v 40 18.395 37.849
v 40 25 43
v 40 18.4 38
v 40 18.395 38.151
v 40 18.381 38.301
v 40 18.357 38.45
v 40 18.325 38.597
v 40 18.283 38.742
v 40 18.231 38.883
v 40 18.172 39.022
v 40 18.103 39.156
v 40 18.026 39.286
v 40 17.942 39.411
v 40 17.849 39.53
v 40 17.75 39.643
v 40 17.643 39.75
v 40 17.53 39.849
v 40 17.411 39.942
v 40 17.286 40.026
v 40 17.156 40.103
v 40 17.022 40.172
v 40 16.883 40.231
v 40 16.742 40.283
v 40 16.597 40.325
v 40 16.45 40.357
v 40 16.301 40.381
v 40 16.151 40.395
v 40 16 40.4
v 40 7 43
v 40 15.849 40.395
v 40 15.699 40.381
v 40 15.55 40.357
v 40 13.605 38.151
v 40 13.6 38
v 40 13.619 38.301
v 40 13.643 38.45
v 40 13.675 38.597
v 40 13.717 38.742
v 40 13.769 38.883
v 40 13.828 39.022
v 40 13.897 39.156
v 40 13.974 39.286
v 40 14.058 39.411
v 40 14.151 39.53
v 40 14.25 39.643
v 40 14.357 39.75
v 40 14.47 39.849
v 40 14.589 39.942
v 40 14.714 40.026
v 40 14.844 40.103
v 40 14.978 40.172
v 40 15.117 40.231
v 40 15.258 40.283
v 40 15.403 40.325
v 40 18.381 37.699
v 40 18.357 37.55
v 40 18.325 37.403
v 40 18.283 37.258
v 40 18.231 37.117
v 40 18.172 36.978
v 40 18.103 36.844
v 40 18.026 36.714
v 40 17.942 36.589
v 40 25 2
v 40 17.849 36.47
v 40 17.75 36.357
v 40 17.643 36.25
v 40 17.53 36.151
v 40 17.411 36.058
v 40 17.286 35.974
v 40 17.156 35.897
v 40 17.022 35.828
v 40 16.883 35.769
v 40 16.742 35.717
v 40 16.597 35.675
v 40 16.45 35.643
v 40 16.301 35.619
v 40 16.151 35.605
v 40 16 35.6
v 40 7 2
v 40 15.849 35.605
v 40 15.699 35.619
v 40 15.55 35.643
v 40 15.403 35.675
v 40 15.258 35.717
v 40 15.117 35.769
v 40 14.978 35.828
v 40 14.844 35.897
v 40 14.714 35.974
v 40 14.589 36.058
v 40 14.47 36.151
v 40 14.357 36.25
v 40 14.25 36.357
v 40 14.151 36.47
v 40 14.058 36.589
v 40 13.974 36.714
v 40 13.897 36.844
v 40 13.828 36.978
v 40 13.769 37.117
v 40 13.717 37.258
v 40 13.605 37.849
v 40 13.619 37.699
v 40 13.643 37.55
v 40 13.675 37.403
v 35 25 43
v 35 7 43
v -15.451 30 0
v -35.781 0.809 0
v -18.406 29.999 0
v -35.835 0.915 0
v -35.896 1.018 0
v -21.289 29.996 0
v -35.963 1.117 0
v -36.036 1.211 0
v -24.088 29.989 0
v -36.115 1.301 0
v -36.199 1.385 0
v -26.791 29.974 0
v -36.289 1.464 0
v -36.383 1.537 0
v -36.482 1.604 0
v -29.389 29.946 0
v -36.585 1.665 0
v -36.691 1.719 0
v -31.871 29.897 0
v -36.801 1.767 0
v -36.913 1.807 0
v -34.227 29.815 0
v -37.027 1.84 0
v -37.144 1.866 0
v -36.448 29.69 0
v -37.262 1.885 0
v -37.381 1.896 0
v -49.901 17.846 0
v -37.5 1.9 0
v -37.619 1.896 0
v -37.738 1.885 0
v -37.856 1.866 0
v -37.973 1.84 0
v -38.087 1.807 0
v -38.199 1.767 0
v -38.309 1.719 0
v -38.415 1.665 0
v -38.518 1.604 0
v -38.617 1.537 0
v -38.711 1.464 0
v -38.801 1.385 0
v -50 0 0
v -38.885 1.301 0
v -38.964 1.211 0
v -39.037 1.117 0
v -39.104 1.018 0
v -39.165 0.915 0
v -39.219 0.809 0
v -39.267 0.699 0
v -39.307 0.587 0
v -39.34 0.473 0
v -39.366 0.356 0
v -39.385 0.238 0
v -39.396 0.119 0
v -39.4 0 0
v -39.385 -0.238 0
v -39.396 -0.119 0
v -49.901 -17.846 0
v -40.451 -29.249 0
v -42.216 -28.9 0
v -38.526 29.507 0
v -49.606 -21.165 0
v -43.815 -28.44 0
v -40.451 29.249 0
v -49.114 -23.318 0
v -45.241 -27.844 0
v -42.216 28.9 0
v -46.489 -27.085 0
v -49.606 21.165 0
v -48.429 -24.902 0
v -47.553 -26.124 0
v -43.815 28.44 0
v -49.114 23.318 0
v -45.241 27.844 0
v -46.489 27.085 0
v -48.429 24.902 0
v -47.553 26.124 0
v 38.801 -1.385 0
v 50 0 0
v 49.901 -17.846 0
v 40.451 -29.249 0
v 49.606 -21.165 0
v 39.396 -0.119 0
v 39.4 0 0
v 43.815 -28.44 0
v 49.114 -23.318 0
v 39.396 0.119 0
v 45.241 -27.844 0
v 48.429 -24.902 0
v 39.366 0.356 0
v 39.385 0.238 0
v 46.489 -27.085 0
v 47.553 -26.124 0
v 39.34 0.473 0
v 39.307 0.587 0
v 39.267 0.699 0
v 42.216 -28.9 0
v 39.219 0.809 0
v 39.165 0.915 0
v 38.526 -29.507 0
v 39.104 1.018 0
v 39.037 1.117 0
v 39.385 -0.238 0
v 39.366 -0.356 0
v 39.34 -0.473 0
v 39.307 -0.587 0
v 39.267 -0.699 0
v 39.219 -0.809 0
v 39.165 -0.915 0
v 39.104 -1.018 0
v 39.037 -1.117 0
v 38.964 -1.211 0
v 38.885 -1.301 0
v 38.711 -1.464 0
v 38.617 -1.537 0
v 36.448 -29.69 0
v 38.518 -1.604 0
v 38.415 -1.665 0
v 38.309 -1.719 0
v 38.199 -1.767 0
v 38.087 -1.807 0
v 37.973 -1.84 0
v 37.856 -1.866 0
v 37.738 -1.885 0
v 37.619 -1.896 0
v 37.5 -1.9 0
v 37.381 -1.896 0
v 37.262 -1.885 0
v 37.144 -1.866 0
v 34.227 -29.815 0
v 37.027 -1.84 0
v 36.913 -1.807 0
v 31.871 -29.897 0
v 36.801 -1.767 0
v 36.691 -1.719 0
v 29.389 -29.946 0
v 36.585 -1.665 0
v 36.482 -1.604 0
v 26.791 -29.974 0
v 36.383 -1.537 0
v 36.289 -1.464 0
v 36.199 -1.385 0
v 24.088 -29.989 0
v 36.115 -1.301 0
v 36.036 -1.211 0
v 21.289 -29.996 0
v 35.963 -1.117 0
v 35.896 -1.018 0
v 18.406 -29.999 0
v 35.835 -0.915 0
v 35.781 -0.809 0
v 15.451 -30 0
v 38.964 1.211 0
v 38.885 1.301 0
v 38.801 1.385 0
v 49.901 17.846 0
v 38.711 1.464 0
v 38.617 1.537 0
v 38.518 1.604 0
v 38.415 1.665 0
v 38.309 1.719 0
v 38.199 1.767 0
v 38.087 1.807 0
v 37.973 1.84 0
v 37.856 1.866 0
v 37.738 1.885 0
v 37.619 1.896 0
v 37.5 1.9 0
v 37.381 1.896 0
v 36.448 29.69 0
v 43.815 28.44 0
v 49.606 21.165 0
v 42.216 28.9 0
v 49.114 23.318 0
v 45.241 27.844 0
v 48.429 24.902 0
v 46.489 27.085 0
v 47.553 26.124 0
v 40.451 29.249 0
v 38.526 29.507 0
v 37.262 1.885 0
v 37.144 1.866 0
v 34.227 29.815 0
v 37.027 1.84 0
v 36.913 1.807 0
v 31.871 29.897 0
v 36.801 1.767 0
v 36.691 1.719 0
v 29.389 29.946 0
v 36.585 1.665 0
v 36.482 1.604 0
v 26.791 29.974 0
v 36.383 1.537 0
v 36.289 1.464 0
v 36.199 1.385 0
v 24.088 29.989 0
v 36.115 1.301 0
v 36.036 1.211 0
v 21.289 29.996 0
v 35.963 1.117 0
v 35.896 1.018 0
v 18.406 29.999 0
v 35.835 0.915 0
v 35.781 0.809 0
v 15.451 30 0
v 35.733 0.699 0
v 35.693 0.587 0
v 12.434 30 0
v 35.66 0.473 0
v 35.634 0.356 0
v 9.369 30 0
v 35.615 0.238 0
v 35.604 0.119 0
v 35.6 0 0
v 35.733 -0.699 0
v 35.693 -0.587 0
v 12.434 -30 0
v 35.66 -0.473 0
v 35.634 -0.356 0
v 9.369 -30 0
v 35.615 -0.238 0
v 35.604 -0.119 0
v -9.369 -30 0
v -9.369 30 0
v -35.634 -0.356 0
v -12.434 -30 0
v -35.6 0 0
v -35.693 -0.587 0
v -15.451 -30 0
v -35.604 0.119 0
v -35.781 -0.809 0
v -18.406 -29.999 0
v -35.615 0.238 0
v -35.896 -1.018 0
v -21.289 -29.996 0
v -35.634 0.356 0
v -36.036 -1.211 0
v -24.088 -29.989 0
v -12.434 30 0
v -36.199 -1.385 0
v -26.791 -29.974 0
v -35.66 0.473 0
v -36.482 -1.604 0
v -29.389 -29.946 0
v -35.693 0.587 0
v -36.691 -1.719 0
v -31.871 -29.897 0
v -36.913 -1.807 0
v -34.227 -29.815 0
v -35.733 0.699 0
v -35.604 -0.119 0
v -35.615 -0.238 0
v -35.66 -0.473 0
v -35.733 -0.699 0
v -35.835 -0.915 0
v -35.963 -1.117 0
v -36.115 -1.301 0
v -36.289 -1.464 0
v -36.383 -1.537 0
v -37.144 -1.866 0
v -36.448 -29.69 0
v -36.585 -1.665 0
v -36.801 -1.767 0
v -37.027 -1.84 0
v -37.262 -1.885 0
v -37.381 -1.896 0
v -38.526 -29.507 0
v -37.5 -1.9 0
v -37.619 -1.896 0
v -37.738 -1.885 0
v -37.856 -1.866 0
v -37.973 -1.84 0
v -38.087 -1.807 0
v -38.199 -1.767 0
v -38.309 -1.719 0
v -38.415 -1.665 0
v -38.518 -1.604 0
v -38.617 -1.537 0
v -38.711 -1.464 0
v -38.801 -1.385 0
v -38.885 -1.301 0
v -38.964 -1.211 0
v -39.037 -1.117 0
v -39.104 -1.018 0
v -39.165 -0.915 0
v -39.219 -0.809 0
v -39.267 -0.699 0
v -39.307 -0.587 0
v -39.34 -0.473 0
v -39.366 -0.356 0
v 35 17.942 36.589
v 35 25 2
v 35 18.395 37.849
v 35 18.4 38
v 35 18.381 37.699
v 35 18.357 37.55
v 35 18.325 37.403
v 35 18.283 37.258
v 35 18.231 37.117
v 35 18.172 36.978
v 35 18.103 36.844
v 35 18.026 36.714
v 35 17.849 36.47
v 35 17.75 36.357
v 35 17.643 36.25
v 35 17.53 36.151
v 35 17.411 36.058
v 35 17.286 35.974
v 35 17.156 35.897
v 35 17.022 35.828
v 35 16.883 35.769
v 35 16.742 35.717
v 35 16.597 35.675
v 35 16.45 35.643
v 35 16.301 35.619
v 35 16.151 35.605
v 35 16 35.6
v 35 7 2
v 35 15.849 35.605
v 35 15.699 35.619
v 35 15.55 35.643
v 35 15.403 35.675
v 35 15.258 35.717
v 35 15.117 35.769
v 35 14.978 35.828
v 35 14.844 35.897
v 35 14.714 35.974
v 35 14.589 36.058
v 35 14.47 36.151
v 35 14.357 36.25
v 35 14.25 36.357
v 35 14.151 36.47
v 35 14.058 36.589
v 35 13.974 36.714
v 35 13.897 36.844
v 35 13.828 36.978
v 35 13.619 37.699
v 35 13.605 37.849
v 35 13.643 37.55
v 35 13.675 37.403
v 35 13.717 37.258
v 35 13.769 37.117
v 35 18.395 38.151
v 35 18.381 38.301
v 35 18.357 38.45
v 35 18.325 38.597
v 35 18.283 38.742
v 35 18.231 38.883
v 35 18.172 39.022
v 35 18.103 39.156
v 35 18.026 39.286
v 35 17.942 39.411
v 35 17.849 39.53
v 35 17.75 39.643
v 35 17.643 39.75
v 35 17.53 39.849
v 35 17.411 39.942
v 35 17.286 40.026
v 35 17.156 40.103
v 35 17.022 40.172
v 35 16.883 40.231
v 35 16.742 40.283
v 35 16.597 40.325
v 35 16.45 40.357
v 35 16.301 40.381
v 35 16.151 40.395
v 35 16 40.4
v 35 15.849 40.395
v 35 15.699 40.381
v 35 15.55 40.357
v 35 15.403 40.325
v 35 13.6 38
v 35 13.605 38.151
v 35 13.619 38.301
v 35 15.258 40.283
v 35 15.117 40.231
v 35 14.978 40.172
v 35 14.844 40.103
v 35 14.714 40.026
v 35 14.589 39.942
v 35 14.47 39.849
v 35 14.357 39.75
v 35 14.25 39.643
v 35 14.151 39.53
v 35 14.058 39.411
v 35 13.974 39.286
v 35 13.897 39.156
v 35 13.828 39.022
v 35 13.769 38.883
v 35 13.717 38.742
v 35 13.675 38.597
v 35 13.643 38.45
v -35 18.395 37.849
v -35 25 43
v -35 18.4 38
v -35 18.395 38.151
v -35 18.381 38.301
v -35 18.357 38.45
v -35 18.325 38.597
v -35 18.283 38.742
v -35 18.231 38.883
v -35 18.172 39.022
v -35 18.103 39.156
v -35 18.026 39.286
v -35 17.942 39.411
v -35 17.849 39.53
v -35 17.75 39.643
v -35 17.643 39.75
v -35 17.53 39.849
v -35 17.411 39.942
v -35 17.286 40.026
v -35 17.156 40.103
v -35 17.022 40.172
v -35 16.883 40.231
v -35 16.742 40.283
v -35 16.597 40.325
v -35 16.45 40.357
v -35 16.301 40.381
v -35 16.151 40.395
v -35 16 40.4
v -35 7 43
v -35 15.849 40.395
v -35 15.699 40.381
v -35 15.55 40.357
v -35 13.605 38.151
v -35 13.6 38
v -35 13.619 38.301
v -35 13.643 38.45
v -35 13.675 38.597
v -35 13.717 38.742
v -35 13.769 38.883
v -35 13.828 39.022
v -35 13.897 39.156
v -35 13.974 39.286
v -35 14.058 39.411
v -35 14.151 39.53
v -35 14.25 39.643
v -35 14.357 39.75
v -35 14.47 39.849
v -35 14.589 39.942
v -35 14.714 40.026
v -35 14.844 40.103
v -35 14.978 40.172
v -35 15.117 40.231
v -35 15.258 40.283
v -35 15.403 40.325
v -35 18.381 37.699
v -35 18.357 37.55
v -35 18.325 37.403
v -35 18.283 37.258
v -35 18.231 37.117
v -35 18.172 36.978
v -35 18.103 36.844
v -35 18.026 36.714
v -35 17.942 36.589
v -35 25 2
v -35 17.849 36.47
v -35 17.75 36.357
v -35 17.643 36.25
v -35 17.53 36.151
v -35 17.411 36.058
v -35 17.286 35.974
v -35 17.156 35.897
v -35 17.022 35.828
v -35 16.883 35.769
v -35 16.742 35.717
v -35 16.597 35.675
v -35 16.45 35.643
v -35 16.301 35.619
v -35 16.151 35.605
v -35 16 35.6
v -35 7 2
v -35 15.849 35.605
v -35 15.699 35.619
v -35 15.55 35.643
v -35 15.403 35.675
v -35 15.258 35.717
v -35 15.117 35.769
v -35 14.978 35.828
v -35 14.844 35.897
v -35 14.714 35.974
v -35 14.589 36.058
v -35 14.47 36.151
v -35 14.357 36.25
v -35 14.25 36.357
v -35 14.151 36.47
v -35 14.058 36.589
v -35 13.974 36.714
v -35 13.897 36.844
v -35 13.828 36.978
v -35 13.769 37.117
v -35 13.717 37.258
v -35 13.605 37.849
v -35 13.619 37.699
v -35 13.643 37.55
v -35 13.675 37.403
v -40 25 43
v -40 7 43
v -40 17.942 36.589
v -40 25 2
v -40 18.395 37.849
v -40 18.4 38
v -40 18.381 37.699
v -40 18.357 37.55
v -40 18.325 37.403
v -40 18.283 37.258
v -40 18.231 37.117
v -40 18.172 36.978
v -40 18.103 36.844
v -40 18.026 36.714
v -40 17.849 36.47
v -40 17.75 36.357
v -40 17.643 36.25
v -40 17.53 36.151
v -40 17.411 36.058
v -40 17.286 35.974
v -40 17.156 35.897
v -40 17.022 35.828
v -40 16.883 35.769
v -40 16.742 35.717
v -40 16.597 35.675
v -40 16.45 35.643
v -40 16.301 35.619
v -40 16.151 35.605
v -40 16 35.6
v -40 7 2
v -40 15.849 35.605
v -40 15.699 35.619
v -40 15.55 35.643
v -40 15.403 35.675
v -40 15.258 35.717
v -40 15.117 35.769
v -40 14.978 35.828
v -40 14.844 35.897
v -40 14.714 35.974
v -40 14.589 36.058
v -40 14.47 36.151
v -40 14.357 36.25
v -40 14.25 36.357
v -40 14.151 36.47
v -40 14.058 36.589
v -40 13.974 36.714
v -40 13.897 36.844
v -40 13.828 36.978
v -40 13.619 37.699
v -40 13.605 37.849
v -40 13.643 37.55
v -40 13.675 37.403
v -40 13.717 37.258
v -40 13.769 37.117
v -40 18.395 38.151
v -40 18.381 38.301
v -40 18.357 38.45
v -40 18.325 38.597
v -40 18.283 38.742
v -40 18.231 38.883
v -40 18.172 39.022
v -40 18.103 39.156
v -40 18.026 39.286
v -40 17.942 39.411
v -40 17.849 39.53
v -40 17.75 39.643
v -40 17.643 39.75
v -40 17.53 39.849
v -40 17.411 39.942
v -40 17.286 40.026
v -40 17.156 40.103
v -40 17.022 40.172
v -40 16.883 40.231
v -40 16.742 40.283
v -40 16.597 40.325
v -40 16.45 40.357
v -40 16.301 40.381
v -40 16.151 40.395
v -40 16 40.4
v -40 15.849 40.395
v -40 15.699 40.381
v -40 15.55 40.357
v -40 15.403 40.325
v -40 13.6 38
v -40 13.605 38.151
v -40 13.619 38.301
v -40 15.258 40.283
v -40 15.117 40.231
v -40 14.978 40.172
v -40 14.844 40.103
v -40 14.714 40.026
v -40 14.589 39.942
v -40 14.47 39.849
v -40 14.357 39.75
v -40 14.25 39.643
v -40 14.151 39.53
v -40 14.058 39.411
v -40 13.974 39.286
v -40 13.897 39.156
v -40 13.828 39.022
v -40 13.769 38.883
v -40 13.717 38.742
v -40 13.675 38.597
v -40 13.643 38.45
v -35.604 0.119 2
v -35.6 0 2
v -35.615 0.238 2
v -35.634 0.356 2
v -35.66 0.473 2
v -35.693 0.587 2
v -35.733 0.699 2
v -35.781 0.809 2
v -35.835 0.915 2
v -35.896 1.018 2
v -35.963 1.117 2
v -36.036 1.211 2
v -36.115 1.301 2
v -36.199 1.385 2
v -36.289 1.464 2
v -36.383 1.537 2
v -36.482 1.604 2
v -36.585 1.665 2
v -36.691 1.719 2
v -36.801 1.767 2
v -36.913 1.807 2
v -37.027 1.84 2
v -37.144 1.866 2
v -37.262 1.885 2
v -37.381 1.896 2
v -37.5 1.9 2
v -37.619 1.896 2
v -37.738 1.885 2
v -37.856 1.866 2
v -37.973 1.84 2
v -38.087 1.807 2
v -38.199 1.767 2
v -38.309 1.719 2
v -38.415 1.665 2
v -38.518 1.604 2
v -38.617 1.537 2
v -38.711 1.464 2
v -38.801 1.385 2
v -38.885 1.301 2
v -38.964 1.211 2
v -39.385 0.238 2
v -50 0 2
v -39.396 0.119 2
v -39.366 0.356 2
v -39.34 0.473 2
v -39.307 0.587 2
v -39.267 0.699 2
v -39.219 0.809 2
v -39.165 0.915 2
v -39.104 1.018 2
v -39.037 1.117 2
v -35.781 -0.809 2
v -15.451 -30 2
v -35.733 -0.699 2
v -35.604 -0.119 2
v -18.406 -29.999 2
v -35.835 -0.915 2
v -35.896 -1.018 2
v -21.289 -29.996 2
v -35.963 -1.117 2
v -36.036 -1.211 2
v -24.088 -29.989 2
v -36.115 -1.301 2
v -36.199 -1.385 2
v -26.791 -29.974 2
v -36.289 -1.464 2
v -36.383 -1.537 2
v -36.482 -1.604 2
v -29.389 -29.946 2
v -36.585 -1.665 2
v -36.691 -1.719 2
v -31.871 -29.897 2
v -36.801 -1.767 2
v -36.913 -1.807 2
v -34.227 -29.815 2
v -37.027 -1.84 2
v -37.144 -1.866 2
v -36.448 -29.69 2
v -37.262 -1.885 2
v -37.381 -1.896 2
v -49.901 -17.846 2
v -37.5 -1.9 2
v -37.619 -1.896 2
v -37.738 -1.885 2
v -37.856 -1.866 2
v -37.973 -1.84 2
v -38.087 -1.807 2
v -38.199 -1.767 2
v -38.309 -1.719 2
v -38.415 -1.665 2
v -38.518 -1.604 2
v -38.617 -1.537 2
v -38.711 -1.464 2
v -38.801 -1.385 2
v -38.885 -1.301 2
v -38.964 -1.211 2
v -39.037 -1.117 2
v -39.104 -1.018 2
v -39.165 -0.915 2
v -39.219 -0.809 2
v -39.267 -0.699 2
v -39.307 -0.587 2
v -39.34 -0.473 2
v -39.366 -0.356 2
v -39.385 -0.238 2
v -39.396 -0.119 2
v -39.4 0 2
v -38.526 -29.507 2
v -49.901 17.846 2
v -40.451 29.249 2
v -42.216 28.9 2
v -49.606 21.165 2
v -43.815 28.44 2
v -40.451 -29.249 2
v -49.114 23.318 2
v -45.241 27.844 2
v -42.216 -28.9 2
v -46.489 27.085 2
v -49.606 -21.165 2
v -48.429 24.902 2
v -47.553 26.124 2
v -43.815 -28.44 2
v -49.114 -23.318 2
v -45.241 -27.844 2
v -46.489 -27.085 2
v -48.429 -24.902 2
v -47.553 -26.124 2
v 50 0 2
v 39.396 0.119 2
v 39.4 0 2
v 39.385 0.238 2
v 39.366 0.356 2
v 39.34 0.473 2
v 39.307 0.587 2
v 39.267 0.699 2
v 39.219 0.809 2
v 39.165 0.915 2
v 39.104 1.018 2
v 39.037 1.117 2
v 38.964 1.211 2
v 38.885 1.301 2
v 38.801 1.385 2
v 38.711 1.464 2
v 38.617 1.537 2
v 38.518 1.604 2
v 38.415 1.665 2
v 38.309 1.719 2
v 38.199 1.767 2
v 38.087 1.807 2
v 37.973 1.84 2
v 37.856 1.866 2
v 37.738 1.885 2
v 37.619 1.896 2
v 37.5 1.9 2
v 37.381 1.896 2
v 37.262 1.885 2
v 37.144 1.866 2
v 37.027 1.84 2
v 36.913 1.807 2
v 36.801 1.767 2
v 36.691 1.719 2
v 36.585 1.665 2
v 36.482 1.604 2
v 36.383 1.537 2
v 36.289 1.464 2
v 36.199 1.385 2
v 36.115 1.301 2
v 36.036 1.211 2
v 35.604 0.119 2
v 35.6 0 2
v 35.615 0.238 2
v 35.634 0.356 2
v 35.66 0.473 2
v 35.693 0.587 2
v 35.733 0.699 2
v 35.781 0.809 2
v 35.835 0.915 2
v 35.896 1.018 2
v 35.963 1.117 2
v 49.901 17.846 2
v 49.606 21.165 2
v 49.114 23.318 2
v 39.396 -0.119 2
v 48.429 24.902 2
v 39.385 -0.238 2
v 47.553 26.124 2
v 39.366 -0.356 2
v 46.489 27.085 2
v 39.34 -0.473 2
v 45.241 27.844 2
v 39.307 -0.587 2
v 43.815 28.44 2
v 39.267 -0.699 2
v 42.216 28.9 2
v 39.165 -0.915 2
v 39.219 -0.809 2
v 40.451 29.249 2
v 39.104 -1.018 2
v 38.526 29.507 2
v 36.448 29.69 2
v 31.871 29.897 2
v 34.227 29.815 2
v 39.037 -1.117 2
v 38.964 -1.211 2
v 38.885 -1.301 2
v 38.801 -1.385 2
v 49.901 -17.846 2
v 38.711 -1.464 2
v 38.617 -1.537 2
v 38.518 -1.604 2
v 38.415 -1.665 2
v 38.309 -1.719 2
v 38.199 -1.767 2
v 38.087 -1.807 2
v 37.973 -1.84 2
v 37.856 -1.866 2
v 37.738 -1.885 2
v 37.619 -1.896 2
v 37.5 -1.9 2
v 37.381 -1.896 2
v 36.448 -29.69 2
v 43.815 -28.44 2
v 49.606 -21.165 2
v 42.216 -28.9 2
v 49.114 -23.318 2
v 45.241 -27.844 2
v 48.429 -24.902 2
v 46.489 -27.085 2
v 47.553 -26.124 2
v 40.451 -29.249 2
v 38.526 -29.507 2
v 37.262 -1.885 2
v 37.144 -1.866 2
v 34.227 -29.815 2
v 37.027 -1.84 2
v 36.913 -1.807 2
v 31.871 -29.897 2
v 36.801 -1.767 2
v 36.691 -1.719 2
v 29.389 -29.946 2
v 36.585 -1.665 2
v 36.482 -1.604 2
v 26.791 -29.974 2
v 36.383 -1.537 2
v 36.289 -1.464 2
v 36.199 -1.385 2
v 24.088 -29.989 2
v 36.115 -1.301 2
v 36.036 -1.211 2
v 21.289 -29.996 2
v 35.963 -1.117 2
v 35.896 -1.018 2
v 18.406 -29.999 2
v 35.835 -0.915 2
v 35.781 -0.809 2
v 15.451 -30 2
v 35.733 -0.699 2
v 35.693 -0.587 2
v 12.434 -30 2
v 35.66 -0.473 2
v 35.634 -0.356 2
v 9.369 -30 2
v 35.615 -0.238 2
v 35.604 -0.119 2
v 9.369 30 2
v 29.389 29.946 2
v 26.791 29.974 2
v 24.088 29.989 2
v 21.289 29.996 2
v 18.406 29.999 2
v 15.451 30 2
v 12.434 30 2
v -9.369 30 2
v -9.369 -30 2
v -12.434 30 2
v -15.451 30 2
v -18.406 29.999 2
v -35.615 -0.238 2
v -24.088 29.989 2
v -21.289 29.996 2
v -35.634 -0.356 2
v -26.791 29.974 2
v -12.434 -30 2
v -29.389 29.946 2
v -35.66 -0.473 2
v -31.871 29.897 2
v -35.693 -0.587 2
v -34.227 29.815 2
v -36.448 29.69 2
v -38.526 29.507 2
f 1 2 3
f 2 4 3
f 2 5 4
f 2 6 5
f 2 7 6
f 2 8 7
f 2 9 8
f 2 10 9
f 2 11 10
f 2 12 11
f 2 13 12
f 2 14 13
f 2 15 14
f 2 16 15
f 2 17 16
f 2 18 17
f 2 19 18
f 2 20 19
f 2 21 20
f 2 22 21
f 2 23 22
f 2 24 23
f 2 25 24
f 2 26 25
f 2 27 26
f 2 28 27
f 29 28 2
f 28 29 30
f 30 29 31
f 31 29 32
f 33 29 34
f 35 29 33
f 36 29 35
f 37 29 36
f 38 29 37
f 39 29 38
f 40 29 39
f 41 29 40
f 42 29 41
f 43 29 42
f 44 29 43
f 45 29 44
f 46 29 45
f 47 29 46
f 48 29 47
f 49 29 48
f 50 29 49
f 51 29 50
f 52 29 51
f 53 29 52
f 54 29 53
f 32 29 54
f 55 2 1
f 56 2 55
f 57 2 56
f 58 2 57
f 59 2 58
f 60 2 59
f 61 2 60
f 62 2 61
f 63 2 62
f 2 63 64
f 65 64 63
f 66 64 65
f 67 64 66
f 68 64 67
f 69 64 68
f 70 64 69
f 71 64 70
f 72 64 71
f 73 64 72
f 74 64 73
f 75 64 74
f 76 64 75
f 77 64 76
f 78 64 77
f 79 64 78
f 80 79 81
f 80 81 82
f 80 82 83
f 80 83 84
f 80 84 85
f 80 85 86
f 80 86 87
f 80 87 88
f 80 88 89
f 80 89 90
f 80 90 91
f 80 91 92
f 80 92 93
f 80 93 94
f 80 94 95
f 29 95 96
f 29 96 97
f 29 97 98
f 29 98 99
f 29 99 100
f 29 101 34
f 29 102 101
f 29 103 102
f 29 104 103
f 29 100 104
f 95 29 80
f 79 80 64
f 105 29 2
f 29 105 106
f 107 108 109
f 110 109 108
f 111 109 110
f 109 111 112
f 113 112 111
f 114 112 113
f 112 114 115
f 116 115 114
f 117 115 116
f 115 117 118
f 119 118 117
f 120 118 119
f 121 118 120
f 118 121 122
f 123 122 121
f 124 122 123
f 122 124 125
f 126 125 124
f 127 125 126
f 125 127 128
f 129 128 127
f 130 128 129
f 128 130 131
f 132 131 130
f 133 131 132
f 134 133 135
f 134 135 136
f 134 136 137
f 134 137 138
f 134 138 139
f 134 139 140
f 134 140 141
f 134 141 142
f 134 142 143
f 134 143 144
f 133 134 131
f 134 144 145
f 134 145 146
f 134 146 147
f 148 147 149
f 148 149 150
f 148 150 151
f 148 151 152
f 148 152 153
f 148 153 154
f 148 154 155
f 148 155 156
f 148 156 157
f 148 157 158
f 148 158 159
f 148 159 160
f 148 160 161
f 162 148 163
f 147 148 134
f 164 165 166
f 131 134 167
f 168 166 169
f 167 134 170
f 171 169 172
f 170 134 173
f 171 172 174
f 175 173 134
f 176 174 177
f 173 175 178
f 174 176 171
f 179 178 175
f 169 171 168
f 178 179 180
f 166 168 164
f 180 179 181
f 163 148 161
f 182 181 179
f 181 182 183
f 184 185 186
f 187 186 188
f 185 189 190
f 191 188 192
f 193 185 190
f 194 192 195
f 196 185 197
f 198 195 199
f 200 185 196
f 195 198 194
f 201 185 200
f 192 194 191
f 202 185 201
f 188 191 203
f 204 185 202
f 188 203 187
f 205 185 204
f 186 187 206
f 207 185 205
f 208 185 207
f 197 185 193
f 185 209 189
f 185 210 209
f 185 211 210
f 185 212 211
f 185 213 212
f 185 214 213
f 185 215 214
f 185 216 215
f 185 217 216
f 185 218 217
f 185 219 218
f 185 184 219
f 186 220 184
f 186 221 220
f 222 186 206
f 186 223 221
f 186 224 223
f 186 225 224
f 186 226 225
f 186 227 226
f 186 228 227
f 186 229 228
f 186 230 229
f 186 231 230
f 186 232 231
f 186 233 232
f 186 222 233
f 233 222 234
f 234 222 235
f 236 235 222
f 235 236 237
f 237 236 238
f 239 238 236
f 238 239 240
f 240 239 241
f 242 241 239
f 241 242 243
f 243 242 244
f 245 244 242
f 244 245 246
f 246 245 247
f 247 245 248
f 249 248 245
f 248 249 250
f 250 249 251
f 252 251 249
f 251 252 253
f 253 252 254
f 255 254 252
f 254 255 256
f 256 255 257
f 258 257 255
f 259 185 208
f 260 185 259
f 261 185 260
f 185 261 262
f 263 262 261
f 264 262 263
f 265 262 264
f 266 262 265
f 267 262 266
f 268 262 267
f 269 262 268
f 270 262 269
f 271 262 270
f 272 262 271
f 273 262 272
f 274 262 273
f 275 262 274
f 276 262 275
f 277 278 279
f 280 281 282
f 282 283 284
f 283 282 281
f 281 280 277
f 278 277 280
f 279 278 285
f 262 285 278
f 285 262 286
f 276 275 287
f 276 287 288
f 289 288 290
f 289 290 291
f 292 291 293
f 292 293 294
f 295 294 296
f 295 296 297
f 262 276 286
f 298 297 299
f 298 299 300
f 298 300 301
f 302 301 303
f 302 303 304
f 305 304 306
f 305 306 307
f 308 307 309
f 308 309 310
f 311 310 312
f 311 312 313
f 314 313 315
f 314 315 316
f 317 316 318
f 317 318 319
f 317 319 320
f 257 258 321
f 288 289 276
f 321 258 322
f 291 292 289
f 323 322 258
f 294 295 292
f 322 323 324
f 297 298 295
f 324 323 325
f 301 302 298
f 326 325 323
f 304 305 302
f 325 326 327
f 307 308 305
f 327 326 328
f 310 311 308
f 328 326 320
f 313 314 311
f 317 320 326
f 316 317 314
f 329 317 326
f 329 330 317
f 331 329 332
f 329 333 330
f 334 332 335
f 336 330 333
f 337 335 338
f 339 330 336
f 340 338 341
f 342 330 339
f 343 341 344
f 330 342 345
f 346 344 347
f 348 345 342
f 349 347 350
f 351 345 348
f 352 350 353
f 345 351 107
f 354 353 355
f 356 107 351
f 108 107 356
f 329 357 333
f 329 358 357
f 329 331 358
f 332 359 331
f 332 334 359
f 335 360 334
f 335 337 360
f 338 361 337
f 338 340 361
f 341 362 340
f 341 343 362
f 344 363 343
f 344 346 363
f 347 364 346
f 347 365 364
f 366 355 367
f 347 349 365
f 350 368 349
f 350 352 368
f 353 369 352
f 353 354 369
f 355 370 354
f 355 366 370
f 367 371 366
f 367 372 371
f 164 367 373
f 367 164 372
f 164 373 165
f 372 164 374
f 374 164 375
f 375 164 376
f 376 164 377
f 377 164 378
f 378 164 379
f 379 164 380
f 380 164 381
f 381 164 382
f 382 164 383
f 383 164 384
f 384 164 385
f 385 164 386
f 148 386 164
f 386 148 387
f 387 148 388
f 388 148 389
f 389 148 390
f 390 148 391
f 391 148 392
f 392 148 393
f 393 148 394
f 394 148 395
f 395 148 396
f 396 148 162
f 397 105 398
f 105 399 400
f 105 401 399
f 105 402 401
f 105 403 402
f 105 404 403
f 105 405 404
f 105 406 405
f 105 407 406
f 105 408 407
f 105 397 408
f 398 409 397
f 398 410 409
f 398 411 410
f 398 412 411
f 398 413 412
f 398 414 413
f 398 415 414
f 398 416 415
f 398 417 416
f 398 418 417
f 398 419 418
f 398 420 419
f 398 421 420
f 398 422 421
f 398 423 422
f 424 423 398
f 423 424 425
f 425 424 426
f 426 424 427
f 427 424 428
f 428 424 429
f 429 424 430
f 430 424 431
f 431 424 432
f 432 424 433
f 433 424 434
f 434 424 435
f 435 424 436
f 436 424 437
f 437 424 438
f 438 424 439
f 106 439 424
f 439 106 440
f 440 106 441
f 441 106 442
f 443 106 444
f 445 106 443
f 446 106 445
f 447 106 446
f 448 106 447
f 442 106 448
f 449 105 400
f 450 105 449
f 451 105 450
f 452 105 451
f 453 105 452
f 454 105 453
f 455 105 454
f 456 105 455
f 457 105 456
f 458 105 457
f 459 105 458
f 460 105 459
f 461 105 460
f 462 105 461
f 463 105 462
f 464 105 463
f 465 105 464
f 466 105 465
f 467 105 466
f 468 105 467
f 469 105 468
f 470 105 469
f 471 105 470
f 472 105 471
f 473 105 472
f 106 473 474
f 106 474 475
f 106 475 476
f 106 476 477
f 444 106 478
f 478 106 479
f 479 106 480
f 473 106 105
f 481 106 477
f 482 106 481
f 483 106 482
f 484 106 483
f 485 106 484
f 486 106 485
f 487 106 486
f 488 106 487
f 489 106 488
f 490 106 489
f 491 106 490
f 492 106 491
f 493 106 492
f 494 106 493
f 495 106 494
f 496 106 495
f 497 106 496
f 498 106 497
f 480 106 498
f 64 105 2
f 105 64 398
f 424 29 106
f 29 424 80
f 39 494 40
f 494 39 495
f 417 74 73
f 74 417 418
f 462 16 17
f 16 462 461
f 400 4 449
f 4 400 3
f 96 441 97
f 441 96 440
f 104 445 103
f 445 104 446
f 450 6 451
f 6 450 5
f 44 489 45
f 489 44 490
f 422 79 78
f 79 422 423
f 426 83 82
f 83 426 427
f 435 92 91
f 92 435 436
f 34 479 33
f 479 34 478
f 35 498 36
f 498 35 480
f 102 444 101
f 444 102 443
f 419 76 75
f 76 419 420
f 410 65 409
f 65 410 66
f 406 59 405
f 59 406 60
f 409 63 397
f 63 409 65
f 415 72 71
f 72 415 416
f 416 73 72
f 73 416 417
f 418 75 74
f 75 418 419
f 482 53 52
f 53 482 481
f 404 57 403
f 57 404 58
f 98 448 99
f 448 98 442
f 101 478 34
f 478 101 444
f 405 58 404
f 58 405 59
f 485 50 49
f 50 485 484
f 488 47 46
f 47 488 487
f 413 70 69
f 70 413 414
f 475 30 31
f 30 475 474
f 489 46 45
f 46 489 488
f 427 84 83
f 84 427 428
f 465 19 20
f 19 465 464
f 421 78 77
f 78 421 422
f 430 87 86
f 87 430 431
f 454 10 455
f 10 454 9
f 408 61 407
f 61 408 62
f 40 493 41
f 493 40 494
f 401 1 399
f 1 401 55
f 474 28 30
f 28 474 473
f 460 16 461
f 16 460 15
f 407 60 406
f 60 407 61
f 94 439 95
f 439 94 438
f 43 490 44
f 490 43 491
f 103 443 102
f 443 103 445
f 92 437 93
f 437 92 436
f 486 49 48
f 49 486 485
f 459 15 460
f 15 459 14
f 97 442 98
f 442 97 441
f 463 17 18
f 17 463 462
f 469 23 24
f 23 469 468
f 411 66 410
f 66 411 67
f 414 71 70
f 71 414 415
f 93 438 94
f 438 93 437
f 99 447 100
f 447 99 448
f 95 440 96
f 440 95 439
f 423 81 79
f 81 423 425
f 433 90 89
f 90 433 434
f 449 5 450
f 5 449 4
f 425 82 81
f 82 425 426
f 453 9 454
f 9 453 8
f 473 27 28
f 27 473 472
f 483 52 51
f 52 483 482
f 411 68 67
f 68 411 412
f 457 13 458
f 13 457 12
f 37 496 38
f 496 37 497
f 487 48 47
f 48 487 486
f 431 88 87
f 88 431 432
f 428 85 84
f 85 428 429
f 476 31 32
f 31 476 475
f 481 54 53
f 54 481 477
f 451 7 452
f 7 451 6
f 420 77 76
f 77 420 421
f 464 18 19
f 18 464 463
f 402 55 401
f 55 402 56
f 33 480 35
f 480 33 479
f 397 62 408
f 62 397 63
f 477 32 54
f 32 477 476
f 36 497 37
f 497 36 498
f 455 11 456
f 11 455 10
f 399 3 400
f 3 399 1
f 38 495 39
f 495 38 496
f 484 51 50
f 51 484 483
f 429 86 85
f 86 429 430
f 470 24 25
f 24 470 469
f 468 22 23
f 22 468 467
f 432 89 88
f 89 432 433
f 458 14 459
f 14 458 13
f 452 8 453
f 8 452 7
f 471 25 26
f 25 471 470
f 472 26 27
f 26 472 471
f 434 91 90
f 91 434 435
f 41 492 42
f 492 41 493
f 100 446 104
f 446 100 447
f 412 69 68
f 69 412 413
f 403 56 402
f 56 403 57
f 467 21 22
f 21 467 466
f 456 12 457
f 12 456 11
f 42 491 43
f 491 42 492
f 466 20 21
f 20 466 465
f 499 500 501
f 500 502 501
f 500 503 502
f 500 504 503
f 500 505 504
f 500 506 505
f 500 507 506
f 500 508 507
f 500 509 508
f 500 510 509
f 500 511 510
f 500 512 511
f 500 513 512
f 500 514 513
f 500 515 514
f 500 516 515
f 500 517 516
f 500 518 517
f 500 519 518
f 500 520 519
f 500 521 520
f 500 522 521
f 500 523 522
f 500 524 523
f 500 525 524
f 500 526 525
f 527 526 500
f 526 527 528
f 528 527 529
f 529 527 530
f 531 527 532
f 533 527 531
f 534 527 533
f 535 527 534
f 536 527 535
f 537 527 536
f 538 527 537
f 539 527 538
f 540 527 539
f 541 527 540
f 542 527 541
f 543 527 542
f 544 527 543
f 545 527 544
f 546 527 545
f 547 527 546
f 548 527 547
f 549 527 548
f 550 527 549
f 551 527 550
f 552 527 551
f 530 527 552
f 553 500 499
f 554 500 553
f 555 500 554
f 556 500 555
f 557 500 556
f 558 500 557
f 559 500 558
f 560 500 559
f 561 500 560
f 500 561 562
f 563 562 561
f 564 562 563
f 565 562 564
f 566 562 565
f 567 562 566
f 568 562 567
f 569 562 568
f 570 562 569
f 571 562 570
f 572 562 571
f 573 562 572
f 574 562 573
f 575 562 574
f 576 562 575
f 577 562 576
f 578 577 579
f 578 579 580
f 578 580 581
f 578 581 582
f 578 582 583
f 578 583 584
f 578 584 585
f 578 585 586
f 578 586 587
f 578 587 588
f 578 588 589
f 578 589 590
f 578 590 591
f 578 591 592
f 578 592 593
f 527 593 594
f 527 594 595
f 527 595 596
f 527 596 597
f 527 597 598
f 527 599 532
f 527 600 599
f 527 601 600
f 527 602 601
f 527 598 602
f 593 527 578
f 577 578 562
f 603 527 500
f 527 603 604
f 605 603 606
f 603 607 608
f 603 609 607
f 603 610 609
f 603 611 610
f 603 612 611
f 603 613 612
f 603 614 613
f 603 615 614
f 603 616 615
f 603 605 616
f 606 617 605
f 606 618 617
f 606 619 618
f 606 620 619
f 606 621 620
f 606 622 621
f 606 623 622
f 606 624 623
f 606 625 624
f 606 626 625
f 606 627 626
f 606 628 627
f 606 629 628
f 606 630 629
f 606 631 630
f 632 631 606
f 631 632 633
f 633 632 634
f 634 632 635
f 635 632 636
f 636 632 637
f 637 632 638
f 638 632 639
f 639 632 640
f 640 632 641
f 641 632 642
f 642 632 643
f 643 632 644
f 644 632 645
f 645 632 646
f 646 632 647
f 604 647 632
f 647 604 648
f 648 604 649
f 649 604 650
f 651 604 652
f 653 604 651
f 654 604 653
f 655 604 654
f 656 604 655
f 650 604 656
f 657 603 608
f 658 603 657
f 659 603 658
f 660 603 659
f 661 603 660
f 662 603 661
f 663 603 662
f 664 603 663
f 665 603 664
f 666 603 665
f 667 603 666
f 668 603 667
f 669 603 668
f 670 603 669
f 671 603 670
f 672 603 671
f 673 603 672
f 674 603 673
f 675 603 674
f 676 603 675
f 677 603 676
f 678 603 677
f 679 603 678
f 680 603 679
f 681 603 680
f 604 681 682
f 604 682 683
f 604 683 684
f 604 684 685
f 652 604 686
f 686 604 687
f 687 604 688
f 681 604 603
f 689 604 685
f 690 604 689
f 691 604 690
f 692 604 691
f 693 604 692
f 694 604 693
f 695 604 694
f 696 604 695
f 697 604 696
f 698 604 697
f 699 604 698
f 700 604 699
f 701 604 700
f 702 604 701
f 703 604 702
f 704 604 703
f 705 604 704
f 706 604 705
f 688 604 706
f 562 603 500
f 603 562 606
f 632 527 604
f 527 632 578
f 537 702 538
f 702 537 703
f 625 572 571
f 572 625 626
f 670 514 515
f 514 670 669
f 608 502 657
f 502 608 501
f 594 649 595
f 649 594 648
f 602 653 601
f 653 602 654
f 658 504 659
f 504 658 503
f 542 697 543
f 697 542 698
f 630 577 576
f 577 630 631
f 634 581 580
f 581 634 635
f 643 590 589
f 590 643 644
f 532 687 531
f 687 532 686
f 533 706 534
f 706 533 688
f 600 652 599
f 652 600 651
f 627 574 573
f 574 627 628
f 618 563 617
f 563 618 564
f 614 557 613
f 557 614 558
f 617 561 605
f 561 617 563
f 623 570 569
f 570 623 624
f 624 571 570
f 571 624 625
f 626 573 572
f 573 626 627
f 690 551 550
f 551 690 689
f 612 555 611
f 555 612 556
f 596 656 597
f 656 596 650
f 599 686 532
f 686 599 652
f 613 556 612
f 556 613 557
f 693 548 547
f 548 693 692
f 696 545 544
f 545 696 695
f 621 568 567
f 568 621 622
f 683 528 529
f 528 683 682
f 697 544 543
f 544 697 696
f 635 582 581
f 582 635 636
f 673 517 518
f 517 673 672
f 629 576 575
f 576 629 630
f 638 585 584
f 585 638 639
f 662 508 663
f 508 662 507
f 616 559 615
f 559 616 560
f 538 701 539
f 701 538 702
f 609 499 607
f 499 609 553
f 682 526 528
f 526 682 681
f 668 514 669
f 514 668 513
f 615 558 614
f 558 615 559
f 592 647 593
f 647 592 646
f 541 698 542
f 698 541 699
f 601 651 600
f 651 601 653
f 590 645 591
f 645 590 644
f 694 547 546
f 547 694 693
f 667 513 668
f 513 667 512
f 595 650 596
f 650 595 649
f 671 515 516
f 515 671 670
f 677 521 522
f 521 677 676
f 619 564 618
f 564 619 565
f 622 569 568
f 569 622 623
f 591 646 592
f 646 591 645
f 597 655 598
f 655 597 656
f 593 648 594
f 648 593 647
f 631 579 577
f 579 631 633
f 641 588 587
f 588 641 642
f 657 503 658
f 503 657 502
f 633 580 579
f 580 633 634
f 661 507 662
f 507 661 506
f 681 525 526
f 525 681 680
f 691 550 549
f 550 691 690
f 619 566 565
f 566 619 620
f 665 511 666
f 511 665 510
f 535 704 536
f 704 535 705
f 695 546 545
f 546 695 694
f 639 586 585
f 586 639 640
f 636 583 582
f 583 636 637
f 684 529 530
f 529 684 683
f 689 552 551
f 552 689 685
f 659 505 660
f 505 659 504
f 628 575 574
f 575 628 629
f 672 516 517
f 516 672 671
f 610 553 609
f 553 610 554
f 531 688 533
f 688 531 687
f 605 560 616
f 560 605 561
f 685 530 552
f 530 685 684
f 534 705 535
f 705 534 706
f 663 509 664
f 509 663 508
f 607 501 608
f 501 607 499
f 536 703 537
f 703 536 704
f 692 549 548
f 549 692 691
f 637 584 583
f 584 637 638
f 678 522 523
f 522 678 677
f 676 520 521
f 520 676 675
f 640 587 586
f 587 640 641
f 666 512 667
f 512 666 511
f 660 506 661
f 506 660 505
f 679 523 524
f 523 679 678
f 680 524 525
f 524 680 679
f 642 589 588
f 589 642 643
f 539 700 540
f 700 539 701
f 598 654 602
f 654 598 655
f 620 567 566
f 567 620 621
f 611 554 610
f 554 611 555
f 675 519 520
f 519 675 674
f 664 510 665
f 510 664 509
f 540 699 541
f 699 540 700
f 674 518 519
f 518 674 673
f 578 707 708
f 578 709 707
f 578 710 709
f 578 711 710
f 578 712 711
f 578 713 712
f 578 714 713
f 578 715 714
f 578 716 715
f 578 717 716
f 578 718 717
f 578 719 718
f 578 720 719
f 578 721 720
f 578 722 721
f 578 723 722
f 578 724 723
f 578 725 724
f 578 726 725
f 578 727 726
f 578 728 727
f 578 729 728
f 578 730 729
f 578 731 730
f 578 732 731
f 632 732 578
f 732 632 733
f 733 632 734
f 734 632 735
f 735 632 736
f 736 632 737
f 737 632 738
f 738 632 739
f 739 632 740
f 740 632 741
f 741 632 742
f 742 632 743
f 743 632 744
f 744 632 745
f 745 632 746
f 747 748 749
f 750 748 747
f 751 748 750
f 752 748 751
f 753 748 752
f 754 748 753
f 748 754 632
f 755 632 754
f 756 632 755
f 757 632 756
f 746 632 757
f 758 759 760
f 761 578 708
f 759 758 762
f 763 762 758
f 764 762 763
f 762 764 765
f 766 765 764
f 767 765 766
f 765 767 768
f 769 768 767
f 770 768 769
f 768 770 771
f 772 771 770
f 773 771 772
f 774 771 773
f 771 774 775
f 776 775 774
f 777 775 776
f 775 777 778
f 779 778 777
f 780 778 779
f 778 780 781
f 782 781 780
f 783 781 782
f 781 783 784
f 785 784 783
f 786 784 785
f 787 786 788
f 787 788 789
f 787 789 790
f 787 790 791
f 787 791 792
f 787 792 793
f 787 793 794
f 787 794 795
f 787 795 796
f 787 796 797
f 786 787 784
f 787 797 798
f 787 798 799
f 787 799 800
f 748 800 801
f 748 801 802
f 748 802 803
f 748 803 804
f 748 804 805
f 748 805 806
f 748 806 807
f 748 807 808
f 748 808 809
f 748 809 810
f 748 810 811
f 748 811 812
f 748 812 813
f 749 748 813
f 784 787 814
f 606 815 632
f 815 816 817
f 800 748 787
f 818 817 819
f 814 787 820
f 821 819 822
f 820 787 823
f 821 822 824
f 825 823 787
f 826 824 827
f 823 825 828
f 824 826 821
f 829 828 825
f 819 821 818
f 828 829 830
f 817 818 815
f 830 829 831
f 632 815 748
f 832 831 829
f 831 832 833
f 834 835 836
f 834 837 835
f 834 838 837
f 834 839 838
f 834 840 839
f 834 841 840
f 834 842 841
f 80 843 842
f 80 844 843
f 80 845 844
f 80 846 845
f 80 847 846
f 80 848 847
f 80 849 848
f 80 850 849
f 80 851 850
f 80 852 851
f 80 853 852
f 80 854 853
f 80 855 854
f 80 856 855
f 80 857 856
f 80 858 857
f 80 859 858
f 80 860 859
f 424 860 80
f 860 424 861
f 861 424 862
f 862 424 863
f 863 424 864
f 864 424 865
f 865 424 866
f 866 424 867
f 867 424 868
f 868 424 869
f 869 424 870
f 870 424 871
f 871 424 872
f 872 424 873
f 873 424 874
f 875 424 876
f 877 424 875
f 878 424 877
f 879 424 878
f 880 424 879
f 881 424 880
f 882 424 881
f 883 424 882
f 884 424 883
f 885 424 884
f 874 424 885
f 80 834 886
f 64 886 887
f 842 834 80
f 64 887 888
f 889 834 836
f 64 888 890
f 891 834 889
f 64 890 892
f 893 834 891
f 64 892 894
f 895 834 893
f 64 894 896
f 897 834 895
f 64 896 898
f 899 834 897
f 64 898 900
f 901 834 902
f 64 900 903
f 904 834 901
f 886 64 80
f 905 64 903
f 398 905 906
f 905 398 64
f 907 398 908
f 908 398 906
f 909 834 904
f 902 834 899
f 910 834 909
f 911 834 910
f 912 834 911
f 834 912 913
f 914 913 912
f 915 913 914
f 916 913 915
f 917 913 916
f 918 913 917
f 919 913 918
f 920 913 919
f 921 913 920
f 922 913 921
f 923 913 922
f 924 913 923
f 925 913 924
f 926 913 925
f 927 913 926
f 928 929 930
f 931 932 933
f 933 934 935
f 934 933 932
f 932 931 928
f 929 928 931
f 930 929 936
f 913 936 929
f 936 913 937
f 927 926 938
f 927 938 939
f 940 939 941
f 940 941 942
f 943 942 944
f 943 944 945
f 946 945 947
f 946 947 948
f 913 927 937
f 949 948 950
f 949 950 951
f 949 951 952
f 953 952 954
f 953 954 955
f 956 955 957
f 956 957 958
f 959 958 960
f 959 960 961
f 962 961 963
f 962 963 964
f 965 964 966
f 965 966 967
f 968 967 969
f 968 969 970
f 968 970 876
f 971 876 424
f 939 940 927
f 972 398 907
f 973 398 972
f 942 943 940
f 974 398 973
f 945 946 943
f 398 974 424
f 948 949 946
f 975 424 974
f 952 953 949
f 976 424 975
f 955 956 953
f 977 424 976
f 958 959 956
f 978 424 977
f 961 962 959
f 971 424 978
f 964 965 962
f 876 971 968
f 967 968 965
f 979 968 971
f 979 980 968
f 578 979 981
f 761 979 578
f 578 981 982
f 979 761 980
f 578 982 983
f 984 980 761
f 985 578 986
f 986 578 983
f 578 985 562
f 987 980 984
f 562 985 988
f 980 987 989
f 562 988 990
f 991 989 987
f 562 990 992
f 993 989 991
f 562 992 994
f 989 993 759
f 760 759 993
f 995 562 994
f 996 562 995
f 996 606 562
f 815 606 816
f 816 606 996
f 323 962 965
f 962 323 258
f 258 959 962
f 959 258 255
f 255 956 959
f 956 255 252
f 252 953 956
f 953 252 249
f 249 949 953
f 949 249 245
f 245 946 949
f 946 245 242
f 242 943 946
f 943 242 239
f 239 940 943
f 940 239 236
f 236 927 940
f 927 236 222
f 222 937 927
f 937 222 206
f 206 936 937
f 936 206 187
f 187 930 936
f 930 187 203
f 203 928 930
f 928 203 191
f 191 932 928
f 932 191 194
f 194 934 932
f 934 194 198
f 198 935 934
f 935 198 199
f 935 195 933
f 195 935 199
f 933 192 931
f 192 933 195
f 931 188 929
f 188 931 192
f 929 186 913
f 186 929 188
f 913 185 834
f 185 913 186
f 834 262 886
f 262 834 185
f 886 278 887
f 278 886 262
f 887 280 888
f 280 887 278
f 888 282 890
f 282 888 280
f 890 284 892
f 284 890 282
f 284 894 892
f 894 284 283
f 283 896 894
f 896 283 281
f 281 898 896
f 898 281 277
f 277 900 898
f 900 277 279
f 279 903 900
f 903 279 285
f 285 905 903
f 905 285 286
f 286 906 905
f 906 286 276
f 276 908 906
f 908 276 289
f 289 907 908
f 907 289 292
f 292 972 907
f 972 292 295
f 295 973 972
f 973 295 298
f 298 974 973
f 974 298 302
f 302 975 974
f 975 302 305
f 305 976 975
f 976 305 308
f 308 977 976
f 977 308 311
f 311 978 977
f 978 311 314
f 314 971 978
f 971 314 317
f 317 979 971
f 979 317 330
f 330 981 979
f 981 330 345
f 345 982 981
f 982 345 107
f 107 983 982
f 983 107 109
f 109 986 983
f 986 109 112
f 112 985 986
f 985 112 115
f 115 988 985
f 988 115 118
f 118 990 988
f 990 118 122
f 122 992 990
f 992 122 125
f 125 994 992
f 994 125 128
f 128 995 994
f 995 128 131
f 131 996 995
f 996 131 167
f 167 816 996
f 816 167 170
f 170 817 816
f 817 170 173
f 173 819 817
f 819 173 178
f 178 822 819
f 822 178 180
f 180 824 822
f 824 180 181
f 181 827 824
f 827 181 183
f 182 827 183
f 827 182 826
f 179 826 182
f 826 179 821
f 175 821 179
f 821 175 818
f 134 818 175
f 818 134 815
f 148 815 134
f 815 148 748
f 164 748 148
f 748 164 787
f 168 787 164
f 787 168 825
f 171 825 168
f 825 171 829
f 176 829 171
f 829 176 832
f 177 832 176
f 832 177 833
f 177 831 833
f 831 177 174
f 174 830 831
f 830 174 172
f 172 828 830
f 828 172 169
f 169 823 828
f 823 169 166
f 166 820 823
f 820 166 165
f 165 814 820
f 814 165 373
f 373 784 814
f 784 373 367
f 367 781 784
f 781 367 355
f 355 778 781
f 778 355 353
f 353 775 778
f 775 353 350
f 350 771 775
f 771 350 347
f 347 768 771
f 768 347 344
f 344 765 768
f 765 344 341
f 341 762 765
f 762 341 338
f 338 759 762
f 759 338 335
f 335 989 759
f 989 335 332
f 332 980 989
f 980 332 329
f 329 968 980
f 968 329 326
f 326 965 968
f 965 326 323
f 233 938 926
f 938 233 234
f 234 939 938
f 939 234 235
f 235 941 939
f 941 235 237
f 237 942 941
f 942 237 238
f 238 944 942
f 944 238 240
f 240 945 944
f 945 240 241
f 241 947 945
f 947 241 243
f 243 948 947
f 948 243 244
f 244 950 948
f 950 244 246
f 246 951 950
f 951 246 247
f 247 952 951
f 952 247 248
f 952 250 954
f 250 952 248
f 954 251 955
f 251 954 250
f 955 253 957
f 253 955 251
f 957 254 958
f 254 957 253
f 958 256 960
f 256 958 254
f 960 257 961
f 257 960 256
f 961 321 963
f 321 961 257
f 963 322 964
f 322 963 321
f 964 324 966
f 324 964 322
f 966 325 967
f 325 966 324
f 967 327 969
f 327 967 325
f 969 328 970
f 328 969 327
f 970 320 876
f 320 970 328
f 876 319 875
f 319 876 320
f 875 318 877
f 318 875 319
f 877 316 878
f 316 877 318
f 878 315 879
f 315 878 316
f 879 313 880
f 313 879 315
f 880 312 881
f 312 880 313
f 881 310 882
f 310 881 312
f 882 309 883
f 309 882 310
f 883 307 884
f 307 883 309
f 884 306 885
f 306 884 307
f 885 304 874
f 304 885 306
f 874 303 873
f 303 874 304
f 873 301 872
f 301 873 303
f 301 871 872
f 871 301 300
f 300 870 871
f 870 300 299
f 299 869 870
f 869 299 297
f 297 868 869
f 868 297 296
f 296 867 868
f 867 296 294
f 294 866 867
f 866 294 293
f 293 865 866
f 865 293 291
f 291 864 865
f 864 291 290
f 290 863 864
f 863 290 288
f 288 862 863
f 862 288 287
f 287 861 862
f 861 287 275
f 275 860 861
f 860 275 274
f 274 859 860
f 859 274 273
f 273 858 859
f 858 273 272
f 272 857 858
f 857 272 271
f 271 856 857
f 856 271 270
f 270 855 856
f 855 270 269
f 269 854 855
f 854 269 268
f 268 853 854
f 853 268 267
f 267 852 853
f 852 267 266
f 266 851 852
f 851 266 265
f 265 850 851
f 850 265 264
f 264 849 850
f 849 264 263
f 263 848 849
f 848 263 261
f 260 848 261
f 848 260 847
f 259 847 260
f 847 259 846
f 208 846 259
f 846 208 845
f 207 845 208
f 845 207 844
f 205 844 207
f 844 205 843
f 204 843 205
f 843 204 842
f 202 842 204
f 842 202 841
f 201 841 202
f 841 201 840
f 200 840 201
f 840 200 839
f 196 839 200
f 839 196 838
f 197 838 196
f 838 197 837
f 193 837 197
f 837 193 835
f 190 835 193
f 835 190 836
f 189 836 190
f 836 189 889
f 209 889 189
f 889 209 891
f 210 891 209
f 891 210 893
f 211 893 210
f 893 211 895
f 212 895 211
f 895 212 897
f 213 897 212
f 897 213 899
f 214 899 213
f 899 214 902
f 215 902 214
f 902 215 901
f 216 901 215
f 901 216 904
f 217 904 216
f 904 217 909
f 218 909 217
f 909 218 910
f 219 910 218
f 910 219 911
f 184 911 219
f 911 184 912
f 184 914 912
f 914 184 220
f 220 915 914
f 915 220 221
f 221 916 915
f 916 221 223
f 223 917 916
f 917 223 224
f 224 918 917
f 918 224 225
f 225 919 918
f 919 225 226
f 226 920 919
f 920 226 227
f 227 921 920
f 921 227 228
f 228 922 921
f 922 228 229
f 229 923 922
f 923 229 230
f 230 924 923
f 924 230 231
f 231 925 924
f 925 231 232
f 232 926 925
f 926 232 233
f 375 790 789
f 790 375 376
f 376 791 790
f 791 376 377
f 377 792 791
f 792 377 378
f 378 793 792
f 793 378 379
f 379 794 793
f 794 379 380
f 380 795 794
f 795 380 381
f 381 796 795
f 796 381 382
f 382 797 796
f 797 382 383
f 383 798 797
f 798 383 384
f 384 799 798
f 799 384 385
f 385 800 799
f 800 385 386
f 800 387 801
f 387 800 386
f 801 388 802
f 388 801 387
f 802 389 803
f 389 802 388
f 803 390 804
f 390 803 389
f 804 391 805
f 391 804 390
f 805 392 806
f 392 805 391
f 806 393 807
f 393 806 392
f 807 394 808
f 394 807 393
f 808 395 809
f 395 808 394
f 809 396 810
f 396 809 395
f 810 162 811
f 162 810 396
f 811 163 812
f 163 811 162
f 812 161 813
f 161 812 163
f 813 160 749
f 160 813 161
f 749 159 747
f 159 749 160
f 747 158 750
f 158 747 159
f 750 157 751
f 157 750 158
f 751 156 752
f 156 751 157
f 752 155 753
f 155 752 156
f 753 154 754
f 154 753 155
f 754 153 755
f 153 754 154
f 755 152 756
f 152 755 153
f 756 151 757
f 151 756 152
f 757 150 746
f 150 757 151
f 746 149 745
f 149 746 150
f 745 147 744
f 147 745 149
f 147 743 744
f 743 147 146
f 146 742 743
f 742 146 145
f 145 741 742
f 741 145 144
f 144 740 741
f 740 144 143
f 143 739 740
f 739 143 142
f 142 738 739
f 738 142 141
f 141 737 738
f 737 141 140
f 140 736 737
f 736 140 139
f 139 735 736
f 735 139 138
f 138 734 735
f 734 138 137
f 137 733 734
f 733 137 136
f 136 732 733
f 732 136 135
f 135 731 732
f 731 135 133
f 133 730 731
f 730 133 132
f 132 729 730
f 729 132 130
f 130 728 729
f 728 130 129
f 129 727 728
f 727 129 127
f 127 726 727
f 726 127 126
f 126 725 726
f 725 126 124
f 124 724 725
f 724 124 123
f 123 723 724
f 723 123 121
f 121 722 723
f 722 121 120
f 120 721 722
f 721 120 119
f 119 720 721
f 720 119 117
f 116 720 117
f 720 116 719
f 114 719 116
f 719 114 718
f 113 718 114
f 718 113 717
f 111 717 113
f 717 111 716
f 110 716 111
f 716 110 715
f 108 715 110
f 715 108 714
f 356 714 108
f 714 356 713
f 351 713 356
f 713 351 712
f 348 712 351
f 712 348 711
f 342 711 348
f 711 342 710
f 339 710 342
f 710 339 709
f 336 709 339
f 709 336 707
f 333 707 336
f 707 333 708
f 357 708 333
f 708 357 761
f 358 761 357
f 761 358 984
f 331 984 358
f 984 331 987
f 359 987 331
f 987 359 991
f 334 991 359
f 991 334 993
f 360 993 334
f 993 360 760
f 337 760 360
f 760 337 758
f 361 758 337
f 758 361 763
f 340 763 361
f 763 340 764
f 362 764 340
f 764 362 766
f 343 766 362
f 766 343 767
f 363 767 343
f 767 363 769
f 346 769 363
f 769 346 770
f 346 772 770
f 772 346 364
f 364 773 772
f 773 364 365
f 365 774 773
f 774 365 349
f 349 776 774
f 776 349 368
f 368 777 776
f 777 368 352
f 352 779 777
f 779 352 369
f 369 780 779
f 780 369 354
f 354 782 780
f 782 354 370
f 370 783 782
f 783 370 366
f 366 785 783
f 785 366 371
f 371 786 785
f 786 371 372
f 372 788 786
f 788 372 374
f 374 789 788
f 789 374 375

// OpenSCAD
// file: ../../functions/reverse.scad
function reverse(lst) =
  let(max = len(lst) - 1) [for(idx = [0 : max]) lst[max - idx]];
// file: ../../modules/superellipse.scad
use <../functions/reverse.scad>

module superellipse(ra = 1, rb = 1, n = 3, $fn = 100) {
  inv_n = 1 / n;
  step = 90 / $fn * 4;

  pos_quadrant_pts = [
    for(angle = [0 : step : 90])
      let(x = sin(angle) * ra, y = rb * (1 - (x / ra) ^ n) ^ inv_n) [x, y]
  ];

  rev_pos_quadrant_pts = reverse(pos_quadrant_pts);

  polygon(points = [
    each rev_pos_quadrant_pts,
    for(p = pos_quadrant_pts) [-p.x, p.y],
    for(p = rev_pos_quadrant_pts) [-p.x, -p.y],
    for(p = pos_quadrant_pts) [p.x, -p.y]
  ]);
}
// main file
use <../../modules/superellipse.scad>

$fn = 100;

linear_extrude(height = 2) difference() {
  superellipse(ra = 50, rb = 30, n = 8);

  translate([37.5, 0]) circle(d = 3.8);
  translate([-37.5, 0]) circle(d = 3.8);
}

translate([37.5, 7]) bracket();
translate([-37.5, 7]) bracket();

module bracket() difference() {
  translate([-2.5, 0]) cube([5, 18, 43]);
  translate([-5, 9, 38]) rotate([0, 90]) cylinder(d = 4.8, h = 10);
}
